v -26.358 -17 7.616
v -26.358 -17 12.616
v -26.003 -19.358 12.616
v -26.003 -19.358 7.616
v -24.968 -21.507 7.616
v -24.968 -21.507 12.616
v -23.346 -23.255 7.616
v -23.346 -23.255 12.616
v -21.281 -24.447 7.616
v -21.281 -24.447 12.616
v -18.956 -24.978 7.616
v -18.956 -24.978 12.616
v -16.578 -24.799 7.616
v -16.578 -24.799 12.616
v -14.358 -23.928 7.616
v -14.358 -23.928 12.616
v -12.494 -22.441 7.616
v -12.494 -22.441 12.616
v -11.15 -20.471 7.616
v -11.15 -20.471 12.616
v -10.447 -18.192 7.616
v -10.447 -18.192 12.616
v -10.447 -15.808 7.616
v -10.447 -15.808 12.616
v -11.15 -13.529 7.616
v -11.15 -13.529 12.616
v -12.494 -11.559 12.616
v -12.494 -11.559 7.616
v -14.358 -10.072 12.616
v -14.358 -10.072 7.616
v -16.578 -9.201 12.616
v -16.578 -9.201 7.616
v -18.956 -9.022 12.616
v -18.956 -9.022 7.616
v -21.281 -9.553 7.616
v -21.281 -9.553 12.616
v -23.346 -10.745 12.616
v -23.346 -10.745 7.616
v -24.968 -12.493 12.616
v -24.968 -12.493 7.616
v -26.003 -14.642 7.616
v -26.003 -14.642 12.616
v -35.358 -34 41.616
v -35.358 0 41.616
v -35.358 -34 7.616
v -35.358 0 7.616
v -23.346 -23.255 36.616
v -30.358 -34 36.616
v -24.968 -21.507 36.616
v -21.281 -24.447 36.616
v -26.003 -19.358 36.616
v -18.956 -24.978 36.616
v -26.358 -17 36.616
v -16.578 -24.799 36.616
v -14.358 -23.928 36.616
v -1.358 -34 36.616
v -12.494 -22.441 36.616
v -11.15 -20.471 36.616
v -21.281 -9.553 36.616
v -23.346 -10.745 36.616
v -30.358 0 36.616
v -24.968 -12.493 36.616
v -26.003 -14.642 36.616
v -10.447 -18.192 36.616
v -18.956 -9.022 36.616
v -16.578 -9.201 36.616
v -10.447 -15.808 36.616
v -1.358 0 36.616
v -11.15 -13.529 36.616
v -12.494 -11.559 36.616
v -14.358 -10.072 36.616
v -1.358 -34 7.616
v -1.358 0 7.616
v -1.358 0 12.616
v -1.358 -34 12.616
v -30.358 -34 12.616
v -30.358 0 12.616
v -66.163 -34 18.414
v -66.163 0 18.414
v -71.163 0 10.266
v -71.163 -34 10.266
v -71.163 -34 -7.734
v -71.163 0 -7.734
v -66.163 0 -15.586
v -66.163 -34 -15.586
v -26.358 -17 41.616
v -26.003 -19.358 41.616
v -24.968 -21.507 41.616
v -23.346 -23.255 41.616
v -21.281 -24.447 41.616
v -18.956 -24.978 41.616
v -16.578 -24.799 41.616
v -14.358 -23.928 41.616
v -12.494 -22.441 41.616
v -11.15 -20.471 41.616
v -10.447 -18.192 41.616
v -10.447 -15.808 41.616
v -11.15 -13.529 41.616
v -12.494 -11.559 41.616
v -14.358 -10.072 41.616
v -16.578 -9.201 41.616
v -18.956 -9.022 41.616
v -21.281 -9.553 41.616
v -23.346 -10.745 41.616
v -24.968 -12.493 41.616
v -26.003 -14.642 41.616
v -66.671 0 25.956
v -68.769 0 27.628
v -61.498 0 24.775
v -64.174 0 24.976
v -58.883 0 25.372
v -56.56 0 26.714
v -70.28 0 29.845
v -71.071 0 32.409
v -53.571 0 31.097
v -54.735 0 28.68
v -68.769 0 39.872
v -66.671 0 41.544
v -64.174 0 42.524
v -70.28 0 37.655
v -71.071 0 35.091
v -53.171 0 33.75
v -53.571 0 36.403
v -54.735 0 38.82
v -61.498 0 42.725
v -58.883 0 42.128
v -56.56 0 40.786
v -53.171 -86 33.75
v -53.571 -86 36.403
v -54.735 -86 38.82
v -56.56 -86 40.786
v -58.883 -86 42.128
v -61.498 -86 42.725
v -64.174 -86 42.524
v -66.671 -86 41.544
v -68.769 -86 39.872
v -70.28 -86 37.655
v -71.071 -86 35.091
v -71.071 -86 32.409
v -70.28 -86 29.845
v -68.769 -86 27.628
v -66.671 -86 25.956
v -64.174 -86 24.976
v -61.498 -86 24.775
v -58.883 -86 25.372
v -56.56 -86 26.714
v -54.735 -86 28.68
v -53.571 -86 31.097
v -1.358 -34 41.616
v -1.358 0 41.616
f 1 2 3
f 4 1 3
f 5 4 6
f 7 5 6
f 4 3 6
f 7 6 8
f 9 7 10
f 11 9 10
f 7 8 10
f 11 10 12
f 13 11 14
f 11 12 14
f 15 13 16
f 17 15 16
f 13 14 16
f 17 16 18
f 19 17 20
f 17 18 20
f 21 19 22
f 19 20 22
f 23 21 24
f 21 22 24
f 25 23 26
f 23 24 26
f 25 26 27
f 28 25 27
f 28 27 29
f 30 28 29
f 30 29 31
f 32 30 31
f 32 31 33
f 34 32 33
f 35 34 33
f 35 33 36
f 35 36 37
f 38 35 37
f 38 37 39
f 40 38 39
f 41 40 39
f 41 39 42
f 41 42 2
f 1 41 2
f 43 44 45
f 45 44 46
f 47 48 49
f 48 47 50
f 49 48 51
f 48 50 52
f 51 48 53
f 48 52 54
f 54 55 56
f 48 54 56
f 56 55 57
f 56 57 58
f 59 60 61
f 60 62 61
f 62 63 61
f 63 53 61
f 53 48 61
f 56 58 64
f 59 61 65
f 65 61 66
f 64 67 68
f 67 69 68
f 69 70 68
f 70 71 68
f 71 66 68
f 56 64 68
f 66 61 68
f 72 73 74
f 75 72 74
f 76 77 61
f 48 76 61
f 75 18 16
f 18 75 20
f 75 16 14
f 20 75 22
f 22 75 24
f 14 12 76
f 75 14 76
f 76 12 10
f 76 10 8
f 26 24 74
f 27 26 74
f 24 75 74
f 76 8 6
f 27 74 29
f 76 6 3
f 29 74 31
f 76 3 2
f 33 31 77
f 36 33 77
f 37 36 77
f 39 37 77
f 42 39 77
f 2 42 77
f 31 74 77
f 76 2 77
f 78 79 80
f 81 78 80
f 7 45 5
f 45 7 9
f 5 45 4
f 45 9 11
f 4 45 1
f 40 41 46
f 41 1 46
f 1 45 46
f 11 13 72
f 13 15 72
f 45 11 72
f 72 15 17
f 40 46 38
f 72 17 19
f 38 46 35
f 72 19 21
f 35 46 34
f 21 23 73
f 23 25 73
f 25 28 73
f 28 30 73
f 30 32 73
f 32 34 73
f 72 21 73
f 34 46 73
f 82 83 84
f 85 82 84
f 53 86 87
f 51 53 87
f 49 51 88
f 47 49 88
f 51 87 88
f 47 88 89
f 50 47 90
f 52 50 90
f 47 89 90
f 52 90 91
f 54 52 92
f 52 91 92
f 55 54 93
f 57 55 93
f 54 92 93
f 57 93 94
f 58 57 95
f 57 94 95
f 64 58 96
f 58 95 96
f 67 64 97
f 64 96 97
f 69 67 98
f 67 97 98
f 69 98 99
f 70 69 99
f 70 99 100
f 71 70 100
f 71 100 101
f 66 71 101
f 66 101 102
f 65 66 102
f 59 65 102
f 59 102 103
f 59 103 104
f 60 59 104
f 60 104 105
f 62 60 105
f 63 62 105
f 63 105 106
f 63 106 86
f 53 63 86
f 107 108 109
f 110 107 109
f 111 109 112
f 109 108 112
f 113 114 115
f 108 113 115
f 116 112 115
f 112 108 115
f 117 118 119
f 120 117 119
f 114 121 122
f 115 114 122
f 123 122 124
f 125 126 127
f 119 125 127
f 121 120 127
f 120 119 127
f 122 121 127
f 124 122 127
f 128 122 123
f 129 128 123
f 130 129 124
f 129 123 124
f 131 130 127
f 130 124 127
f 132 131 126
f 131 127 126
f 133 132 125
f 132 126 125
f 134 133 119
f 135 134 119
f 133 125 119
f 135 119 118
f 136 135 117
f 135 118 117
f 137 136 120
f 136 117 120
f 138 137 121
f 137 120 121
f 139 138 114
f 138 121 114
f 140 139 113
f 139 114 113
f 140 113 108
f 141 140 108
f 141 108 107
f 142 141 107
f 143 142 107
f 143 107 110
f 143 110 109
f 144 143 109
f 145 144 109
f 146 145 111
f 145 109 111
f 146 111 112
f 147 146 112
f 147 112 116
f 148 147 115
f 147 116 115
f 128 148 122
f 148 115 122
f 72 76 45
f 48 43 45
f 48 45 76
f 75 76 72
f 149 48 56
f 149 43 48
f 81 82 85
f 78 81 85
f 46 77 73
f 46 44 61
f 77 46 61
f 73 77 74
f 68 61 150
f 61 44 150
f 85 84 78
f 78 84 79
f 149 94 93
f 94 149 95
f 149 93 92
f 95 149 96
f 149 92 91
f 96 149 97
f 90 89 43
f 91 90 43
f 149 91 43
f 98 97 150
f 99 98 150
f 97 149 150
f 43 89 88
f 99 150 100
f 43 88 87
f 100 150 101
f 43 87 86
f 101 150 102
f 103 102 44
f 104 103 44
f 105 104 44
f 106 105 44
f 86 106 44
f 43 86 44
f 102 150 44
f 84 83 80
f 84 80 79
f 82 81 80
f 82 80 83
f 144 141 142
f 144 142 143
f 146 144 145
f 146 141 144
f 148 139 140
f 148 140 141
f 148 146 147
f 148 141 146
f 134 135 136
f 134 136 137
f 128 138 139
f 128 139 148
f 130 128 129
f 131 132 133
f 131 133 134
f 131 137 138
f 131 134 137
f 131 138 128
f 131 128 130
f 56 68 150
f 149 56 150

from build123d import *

# Parameters (mm, degrees)
F0_R     = 9
F1_DEPTH = 86
F3_DEPTH = 34
F5_D     = 16


with BuildPart() as f1:
    # F0 (on Front) → F1 (new body)
    with BuildSketch(Plane.XZ):
        with Locations((-62.171057, 33.750001)):
            Circle(F0_R)
    extrude(amount=F1_DEPTH)


with BuildPart() as f3:
    # F2 (on Front) → F3 (new body)
    with BuildSketch(Plane.XZ):
        Polygon((-1.357949, 41.615948), (-35.357949, 41.615948), (-35.357949, 7.615948), (-1.357949, 7.615948), (-1.357949, 12.615948), (-30.357949, 12.615948), (-30.357949, 36.615948), (-1.357949, 36.615948), align=None)
        Polygon((-66.162693, -15.585797), (-66.162693, 18.414203), (-71.162693, 10.265756), (-71.162693, -7.734244), align=None)
    extrude(amount=F3_DEPTH)

    # F5 (through all)
    with Locations(Plane(origin=(0, 0, 7.615948), x_dir=(1, 0, 0), z_dir=(0, 0, -1))):
        with Locations((-18.357949, 17)):
            Hole(F5_D / 2)


solid = Compound([f1.part, f3.part])
